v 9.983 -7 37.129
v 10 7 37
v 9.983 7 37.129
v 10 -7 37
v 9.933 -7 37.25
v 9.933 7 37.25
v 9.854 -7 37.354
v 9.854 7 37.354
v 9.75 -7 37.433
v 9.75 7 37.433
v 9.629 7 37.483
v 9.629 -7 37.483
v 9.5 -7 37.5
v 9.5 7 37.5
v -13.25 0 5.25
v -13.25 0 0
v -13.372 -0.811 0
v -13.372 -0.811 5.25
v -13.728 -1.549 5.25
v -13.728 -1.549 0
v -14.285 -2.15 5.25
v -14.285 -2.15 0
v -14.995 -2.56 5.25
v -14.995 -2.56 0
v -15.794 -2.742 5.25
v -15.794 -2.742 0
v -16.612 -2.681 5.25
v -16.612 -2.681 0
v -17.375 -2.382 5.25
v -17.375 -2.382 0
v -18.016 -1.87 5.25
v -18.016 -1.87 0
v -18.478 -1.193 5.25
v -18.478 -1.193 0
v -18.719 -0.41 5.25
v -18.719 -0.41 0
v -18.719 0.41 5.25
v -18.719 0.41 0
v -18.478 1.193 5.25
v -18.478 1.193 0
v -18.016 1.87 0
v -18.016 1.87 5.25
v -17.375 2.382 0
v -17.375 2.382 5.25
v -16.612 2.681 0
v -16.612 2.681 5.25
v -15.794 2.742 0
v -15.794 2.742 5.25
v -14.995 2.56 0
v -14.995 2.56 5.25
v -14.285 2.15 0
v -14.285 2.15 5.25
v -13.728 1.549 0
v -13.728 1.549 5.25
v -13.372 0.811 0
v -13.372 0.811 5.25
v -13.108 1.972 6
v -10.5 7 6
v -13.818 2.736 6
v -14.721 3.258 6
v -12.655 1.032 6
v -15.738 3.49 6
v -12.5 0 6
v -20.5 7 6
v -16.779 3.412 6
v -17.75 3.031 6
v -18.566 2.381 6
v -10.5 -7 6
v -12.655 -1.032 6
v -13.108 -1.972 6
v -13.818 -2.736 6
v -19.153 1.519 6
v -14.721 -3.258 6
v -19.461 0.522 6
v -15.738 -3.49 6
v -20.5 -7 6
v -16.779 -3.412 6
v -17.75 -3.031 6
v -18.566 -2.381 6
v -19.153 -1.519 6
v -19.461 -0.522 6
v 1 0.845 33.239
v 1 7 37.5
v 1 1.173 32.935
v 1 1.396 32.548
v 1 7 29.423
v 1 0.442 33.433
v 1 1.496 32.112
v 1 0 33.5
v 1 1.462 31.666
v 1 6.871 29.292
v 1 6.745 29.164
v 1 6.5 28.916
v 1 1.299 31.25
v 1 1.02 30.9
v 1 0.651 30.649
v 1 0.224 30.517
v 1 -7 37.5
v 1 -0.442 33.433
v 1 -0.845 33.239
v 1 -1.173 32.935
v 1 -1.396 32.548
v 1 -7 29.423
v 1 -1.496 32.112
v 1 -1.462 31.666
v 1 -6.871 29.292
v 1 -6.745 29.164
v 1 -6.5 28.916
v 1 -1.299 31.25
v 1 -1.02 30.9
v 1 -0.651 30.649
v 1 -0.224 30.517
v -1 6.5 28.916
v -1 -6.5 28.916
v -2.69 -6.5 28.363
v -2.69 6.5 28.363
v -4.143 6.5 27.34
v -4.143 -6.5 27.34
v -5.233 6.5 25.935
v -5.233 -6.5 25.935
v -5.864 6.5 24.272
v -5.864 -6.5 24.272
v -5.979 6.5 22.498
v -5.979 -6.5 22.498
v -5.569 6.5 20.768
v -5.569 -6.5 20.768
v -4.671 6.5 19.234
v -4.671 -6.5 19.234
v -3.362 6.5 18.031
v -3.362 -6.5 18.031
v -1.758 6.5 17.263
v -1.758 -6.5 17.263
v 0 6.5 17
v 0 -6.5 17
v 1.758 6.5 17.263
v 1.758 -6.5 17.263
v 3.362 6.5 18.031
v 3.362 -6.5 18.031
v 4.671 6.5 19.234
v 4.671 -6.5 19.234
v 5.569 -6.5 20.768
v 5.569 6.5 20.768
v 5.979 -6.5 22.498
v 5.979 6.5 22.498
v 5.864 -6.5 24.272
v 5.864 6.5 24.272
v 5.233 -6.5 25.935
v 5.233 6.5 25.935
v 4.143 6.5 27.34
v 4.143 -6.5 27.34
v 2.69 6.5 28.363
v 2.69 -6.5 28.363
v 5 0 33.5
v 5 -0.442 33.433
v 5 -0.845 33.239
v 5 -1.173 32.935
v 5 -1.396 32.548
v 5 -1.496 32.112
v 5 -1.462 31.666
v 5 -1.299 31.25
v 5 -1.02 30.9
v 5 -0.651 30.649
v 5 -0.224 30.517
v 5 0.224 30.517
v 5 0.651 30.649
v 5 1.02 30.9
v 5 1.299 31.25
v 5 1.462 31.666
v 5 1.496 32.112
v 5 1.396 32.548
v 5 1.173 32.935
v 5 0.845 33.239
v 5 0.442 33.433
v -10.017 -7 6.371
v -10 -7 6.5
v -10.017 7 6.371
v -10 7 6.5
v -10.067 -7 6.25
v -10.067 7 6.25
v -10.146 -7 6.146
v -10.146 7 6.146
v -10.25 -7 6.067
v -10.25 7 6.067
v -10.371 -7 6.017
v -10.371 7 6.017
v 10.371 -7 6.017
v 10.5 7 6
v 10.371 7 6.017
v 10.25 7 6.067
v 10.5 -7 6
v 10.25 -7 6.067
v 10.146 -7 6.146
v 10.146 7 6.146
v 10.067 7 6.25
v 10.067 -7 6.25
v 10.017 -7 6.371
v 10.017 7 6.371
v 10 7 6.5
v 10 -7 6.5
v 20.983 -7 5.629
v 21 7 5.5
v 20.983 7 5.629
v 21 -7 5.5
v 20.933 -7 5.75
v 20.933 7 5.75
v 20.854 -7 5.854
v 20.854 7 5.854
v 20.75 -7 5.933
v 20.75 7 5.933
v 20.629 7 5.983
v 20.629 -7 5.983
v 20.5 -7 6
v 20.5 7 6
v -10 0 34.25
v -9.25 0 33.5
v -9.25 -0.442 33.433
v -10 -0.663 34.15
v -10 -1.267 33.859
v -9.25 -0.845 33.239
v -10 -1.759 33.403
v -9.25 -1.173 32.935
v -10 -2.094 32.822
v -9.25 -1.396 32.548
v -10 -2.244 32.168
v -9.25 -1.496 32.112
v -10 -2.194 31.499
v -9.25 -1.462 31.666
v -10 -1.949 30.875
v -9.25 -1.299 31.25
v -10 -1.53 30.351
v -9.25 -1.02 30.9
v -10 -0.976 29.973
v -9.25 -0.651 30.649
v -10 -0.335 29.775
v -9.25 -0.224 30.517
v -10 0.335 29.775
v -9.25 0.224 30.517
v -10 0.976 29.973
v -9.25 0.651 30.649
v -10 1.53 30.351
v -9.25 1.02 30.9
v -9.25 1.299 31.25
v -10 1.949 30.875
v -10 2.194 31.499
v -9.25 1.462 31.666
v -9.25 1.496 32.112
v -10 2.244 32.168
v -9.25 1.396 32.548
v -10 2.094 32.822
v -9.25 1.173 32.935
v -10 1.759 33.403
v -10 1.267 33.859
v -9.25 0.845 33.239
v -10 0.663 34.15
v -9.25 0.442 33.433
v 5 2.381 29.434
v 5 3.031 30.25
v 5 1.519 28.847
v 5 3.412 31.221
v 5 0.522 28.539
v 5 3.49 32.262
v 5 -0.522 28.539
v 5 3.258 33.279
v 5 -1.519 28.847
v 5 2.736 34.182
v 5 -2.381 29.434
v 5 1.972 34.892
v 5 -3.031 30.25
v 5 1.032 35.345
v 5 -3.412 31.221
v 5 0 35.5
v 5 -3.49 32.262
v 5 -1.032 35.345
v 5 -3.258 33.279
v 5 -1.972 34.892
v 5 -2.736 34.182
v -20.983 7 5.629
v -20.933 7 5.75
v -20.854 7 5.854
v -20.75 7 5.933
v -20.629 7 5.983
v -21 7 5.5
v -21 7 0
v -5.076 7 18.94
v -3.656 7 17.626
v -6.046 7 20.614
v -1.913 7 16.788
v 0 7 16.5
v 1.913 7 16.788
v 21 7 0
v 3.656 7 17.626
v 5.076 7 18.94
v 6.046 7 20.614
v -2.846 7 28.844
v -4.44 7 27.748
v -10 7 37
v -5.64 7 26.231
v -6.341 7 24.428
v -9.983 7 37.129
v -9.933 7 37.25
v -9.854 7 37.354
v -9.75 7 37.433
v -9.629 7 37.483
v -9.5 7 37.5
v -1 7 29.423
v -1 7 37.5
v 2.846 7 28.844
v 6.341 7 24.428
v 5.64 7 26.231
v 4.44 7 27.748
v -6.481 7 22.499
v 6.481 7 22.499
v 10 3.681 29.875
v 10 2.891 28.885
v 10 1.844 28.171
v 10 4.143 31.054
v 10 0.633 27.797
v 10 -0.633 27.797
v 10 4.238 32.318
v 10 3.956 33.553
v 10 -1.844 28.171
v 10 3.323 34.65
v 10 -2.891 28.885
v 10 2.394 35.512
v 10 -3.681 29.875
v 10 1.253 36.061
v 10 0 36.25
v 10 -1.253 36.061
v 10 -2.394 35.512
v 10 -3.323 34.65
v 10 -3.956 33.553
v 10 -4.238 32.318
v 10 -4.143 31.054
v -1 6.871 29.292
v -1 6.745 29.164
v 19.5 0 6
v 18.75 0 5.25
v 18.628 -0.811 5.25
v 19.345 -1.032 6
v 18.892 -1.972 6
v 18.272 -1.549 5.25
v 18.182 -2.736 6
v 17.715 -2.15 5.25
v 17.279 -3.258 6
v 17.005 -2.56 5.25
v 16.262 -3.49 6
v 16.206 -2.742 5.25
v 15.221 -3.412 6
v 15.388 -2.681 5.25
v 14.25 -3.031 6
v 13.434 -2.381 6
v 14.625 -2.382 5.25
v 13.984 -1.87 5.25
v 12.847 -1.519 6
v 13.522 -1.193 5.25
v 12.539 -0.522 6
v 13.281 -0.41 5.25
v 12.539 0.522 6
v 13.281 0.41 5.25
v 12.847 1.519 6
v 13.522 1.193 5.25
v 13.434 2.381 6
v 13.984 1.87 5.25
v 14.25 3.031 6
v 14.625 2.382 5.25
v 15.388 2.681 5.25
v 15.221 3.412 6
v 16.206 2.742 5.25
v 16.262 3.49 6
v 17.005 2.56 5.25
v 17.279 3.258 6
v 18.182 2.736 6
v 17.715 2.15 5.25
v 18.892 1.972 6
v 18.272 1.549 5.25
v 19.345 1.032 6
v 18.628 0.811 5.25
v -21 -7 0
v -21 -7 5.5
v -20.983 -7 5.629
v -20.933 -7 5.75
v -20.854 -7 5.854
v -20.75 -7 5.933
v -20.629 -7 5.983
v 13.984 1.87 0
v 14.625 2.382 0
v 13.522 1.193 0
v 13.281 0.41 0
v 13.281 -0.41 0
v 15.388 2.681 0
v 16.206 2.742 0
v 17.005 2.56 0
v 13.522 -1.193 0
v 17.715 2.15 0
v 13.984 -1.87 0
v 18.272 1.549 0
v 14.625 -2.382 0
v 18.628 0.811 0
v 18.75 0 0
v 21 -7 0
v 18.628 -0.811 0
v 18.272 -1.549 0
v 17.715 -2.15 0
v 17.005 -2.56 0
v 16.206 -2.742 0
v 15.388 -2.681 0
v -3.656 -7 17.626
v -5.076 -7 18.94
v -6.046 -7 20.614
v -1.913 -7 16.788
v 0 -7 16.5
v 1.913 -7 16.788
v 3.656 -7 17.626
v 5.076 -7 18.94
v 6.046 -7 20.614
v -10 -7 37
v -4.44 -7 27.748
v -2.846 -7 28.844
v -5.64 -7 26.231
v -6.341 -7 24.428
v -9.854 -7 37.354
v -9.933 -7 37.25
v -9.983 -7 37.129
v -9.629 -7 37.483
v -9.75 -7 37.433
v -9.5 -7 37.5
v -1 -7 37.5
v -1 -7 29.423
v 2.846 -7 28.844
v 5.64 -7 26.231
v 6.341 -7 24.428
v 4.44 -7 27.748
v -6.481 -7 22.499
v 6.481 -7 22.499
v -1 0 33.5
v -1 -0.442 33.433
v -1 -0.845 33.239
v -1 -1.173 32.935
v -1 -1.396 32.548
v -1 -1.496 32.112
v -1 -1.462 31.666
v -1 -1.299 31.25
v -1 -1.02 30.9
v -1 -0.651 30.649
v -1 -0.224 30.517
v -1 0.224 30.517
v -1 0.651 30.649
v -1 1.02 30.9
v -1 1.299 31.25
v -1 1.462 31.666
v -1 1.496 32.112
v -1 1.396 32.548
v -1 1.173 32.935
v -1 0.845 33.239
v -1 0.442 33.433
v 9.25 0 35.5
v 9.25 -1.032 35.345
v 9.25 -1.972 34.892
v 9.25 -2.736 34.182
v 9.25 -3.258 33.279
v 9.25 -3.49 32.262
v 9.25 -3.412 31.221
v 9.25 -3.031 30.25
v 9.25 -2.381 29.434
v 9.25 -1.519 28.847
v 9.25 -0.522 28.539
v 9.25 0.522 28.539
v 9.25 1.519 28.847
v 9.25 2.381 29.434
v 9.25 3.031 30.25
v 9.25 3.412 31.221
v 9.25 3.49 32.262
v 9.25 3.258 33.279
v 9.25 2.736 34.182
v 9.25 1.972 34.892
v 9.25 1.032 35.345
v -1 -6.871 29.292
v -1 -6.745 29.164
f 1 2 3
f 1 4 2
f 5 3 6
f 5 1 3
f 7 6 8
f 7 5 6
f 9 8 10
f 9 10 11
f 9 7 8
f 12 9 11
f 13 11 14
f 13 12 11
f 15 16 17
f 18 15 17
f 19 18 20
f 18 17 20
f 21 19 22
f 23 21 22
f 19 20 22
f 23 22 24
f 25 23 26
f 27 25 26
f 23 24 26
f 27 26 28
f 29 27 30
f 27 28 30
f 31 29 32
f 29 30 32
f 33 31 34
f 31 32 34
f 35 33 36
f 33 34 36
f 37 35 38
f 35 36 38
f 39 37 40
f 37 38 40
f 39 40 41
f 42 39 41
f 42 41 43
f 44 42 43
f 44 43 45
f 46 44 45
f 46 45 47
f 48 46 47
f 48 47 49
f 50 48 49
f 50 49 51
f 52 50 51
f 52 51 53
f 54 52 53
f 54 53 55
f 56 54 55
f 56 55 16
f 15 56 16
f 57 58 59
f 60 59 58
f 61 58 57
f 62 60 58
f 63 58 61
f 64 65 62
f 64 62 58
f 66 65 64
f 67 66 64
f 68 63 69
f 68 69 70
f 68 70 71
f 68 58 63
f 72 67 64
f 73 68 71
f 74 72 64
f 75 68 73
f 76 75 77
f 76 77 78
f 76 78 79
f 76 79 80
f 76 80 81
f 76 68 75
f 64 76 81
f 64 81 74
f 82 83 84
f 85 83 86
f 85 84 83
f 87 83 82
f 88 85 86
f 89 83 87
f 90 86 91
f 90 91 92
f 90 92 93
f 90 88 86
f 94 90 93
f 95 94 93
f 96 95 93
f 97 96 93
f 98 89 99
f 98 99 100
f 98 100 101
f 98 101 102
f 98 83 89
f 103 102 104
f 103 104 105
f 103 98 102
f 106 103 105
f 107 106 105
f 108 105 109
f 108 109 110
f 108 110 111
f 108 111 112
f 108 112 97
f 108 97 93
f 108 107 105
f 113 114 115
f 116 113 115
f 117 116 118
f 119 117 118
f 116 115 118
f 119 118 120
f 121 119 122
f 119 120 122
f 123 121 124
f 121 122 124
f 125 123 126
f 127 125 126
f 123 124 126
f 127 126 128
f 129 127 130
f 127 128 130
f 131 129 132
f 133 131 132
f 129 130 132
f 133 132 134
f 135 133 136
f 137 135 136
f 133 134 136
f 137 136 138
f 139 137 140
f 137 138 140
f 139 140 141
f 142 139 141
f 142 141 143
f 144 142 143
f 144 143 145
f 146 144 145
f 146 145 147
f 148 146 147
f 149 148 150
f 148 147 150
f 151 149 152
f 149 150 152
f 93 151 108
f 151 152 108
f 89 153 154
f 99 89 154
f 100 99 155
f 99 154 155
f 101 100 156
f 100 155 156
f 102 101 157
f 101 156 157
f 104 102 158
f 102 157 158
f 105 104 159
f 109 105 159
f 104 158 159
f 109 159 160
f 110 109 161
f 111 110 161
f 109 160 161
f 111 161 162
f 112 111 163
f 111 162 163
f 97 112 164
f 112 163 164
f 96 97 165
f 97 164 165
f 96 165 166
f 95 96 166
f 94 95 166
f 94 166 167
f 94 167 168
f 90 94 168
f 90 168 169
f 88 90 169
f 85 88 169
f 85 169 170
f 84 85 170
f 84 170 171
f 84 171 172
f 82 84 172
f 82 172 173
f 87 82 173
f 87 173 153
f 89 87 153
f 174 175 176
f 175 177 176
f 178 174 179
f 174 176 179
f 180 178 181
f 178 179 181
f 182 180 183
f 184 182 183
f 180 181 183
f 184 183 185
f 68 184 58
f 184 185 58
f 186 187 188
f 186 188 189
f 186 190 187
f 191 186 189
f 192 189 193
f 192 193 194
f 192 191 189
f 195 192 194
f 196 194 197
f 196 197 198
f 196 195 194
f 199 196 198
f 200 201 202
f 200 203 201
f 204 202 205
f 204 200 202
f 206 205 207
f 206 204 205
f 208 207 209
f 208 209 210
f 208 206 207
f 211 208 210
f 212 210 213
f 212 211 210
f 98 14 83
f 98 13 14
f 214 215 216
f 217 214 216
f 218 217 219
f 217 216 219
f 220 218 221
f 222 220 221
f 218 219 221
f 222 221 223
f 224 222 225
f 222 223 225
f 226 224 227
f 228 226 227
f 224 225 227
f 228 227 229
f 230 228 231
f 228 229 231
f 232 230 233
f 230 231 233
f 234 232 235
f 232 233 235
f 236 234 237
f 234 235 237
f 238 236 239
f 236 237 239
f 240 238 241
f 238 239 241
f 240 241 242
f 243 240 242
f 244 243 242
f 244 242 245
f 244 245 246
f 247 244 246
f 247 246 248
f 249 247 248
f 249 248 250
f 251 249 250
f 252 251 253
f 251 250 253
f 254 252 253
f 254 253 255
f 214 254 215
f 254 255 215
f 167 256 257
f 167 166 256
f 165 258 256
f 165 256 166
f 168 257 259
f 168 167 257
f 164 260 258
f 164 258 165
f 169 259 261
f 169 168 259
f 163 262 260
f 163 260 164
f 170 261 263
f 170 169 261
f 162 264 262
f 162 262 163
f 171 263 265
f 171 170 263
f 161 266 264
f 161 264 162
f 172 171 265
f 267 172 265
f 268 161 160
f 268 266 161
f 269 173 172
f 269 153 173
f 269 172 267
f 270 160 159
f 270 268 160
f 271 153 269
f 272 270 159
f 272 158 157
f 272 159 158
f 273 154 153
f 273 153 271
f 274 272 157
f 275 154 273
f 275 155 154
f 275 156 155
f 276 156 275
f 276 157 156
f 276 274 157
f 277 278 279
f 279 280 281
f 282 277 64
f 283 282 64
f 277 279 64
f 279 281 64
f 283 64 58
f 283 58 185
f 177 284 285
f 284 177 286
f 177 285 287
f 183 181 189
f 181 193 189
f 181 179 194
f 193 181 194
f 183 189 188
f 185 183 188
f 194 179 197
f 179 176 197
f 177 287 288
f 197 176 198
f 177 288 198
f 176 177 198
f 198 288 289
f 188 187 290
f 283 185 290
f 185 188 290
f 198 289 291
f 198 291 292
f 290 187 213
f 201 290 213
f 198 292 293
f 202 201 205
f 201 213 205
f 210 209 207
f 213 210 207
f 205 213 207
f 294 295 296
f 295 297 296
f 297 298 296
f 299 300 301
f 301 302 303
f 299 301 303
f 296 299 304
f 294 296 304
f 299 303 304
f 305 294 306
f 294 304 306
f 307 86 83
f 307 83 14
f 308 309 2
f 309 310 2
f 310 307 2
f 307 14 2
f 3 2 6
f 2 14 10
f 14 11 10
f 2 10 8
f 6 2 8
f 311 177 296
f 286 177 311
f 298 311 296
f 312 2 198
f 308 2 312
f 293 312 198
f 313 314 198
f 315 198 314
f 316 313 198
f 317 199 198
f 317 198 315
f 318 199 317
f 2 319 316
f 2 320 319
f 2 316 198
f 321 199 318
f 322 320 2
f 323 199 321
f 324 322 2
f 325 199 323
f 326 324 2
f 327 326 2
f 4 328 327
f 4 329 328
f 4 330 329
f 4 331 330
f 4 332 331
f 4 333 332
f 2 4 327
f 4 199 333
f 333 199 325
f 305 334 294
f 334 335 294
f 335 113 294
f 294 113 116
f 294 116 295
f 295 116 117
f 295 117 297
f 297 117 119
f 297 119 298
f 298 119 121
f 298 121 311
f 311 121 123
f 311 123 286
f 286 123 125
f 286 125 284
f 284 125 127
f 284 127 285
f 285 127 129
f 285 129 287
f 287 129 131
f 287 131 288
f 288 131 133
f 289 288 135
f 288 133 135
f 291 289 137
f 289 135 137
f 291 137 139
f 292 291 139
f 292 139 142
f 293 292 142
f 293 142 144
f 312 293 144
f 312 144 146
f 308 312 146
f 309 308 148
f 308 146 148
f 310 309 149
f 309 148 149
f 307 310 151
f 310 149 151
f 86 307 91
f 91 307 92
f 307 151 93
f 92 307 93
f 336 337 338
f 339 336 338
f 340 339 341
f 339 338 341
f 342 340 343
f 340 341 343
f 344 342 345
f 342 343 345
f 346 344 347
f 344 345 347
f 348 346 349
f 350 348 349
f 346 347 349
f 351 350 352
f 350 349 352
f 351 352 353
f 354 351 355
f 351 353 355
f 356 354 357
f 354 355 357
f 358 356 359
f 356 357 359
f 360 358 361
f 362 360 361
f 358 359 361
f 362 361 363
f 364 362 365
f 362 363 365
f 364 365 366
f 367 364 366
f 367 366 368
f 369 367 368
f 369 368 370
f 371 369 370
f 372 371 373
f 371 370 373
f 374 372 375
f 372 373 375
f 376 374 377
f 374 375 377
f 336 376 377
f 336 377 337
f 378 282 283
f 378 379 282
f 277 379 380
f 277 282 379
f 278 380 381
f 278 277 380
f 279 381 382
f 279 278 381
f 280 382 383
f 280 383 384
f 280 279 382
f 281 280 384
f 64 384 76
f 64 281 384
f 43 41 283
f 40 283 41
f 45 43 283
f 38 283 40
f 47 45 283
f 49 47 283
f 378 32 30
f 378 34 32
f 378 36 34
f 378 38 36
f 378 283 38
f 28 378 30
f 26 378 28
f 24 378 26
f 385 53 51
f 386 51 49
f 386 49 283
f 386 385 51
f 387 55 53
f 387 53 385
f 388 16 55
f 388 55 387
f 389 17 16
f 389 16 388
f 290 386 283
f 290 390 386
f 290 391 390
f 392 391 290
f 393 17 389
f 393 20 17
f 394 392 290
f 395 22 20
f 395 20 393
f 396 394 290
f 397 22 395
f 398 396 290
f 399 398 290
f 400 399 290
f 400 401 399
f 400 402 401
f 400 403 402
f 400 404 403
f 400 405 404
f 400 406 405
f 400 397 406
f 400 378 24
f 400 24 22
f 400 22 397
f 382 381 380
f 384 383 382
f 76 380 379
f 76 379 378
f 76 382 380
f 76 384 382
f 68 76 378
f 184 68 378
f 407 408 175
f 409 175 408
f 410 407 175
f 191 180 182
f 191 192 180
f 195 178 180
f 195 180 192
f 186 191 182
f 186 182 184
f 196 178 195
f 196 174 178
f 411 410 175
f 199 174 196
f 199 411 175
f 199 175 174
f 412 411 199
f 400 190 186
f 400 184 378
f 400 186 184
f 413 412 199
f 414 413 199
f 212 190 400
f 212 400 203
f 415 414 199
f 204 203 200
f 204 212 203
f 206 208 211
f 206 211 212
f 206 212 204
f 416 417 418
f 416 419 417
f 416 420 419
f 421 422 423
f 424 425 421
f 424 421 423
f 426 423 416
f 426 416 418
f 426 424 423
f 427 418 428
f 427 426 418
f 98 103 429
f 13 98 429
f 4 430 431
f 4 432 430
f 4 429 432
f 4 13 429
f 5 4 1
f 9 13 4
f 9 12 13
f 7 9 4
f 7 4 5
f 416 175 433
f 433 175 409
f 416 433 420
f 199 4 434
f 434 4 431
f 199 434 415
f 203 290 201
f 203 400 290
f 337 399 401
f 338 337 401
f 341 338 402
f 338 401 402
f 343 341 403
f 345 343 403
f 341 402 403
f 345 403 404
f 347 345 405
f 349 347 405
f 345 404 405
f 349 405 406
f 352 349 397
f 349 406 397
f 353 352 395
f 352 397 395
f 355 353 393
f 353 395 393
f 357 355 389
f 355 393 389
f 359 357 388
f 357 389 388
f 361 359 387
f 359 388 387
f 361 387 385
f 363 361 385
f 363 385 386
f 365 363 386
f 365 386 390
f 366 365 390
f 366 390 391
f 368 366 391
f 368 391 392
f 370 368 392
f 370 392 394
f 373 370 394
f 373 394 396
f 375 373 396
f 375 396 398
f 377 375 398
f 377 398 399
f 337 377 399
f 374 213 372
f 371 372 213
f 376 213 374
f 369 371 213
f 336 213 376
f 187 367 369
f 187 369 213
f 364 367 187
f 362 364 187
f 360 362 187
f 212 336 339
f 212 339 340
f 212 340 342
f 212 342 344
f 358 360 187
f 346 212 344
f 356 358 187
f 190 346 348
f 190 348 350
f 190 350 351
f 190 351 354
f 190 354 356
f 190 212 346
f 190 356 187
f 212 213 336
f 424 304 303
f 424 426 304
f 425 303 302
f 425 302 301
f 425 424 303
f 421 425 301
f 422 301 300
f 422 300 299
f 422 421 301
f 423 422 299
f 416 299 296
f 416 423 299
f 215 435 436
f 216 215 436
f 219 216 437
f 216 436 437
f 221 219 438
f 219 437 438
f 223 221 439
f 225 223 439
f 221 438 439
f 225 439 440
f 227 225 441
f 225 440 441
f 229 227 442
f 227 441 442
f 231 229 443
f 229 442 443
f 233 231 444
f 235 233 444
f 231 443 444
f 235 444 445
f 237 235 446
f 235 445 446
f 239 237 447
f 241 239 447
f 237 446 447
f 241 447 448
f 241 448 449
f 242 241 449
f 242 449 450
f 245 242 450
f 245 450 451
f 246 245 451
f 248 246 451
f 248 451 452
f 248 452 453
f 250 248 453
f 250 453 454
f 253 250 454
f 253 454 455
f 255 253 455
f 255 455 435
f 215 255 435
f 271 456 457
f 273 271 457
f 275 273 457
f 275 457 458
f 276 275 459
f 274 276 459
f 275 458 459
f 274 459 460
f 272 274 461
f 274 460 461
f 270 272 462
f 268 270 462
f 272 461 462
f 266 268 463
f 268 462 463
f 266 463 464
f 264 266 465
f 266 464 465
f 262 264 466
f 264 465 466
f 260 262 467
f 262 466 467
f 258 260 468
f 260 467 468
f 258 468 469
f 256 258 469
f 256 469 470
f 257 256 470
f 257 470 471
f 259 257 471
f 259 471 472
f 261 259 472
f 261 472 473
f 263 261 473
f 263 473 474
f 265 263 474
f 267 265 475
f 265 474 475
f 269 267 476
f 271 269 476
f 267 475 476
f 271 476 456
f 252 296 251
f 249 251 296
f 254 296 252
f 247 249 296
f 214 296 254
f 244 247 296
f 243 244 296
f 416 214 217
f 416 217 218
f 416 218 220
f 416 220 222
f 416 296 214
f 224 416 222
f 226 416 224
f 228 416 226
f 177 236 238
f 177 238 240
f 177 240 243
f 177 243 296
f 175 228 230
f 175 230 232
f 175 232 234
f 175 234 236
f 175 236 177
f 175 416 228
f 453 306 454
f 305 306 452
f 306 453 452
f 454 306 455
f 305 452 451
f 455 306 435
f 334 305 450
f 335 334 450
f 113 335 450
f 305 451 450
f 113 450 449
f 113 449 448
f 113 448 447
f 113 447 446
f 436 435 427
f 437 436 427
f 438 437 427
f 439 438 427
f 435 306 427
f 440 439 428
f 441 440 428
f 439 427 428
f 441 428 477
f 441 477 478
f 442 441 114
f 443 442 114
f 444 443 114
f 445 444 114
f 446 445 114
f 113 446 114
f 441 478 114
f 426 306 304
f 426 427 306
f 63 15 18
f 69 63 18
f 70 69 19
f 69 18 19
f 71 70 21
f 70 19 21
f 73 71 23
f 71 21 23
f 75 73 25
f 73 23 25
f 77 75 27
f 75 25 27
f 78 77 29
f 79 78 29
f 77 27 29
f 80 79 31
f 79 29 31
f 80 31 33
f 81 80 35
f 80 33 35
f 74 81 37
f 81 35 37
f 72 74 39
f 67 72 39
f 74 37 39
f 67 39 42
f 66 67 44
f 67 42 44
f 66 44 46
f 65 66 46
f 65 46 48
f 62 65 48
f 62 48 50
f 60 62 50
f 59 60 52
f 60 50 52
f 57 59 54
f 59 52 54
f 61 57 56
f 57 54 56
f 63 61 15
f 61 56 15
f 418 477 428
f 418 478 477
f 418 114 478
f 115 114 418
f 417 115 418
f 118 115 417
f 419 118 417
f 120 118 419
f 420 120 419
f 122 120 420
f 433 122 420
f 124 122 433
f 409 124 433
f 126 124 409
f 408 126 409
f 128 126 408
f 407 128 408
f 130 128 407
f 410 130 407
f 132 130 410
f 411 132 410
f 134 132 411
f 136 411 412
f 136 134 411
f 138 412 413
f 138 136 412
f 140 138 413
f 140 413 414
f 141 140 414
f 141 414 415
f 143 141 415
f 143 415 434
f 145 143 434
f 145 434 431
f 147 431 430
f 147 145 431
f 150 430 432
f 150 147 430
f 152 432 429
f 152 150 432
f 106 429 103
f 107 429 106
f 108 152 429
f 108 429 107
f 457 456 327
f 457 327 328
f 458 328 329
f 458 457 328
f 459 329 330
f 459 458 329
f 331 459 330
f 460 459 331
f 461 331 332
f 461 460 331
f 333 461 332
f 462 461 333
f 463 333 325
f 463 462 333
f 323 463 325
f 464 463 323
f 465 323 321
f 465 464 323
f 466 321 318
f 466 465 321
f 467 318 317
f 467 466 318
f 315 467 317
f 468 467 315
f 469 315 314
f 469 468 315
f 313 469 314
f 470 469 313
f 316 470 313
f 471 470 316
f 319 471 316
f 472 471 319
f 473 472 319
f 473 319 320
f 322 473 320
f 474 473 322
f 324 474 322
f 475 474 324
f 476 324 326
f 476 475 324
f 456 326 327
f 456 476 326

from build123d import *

# Parameters (mm, degrees)
PAD_DEPTH       = 7
SKETCH001_R     = 2.75
POCKET_DEPTH    = 37.501
SKETCH002_R     = 3.5
POCKET001_DEPTH = 5
SKETCH003_R     = 1.5
POCKET002_DEPTH = 26.001
FILLET_R        = 0.5
CHAMFER_SIZE    = 0.75
CHAMFER001_SIZE = 0.75
CHAMFER002_SIZE = 0.75
CHAMFER003_SIZE = 0.5


with BuildPart() as part:
    # Sketch → Pad (new body, symmetric)
    with BuildSketch(Plane.XZ):
        with BuildLine():
            Line((-21, 0), (21, 0))
            Line((21, 0), (21, 6))
            Line((21, 6), (10, 6))
            Line((10, 6), (10, 37.5))
            Line((10, 37.5), (1, 37.5))
            Line((1, 37.5), (1, 28.91608))
            ThreePointArc((-1, 28.91608), (0, 17), (1, 28.91608))
            Line((-1, 37.5), (-1, 28.91608))
            Line((-1, 37.5), (-10, 37.5))
            Line((-10, 37.5), (-10, 6))
            Line((-10, 6), (-21, 6))
            Line((-21, 6), (-21, 0))
        make_face()
    extrude(amount=PAD_DEPTH, both=True)

    # Sketch001 → Pocket (cut, through all)
    with BuildSketch(Plane(origin=(0, 0, 0), x_dir=(1, 0, 0), z_dir=(0, 0, -1))):
        with Locations((16, 0)):
            Circle(SKETCH001_R)
        with Locations((-16, 0)):
            Circle(SKETCH001_R)
    extrude(amount=-POCKET_DEPTH, mode=Mode.SUBTRACT)

    # Sketch002 → Pocket001 (cut)
    with BuildSketch(Plane(origin=(10, 0, 0), x_dir=(0, 0, 1), z_dir=(1, 0, 0))):
        with Locations((32, 0)):
            Circle(SKETCH002_R)
    extrude(amount=-POCKET001_DEPTH, mode=Mode.SUBTRACT)

    # Sketch003 → Pocket002 (cut, through all)
    with BuildSketch(Plane(origin=(5, 0, 0), x_dir=(0, 0, 1), z_dir=(1, 0, 0))):
        with Locations((32, 0)):
            Circle(SKETCH003_R)
    extrude(amount=-POCKET002_DEPTH, mode=Mode.SUBTRACT)

    # Fillet
    fillet_edges = [part.edges().sort_by_distance(p)[0] for p in [
        (21, 0, 6),
        (10, 0, 6),
        (10, 0, 37.5),
        (-10, 0, 37.5),
        (-10, 0, 6),
        (-21, 0, 6),
    ]]
    fillet(fillet_edges, radius=FILLET_R)

    # Chamfer
    chamfer_edges = [part.edges().sort_by_distance(p)[0] for p in [
        (13.25, 0, 6),
        (-18.75, 0, 6),
    ]]
    chamfer(chamfer_edges, length=CHAMFER_SIZE)

    # Chamfer001
    chamfer001_edges = [part.edges().sort_by_distance(p)[0] for p in [
        (10, 0, 28.5),
    ]]
    chamfer(chamfer001_edges, length=CHAMFER001_SIZE)

    # Chamfer002
    chamfer002_edges = [part.edges().sort_by_distance(p)[0] for p in [
        (-10, 0, 30.5),
    ]]
    chamfer(chamfer002_edges, length=CHAMFER002_SIZE)

    # Chamfer003
    chamfer003_edges = [part.edges().sort_by_distance(p)[0] for p in [
        (0, 7, 17),
        (0, -7, 17),
    ]]
    chamfer(chamfer003_edges, length=CHAMFER003_SIZE)


solid = part.part
